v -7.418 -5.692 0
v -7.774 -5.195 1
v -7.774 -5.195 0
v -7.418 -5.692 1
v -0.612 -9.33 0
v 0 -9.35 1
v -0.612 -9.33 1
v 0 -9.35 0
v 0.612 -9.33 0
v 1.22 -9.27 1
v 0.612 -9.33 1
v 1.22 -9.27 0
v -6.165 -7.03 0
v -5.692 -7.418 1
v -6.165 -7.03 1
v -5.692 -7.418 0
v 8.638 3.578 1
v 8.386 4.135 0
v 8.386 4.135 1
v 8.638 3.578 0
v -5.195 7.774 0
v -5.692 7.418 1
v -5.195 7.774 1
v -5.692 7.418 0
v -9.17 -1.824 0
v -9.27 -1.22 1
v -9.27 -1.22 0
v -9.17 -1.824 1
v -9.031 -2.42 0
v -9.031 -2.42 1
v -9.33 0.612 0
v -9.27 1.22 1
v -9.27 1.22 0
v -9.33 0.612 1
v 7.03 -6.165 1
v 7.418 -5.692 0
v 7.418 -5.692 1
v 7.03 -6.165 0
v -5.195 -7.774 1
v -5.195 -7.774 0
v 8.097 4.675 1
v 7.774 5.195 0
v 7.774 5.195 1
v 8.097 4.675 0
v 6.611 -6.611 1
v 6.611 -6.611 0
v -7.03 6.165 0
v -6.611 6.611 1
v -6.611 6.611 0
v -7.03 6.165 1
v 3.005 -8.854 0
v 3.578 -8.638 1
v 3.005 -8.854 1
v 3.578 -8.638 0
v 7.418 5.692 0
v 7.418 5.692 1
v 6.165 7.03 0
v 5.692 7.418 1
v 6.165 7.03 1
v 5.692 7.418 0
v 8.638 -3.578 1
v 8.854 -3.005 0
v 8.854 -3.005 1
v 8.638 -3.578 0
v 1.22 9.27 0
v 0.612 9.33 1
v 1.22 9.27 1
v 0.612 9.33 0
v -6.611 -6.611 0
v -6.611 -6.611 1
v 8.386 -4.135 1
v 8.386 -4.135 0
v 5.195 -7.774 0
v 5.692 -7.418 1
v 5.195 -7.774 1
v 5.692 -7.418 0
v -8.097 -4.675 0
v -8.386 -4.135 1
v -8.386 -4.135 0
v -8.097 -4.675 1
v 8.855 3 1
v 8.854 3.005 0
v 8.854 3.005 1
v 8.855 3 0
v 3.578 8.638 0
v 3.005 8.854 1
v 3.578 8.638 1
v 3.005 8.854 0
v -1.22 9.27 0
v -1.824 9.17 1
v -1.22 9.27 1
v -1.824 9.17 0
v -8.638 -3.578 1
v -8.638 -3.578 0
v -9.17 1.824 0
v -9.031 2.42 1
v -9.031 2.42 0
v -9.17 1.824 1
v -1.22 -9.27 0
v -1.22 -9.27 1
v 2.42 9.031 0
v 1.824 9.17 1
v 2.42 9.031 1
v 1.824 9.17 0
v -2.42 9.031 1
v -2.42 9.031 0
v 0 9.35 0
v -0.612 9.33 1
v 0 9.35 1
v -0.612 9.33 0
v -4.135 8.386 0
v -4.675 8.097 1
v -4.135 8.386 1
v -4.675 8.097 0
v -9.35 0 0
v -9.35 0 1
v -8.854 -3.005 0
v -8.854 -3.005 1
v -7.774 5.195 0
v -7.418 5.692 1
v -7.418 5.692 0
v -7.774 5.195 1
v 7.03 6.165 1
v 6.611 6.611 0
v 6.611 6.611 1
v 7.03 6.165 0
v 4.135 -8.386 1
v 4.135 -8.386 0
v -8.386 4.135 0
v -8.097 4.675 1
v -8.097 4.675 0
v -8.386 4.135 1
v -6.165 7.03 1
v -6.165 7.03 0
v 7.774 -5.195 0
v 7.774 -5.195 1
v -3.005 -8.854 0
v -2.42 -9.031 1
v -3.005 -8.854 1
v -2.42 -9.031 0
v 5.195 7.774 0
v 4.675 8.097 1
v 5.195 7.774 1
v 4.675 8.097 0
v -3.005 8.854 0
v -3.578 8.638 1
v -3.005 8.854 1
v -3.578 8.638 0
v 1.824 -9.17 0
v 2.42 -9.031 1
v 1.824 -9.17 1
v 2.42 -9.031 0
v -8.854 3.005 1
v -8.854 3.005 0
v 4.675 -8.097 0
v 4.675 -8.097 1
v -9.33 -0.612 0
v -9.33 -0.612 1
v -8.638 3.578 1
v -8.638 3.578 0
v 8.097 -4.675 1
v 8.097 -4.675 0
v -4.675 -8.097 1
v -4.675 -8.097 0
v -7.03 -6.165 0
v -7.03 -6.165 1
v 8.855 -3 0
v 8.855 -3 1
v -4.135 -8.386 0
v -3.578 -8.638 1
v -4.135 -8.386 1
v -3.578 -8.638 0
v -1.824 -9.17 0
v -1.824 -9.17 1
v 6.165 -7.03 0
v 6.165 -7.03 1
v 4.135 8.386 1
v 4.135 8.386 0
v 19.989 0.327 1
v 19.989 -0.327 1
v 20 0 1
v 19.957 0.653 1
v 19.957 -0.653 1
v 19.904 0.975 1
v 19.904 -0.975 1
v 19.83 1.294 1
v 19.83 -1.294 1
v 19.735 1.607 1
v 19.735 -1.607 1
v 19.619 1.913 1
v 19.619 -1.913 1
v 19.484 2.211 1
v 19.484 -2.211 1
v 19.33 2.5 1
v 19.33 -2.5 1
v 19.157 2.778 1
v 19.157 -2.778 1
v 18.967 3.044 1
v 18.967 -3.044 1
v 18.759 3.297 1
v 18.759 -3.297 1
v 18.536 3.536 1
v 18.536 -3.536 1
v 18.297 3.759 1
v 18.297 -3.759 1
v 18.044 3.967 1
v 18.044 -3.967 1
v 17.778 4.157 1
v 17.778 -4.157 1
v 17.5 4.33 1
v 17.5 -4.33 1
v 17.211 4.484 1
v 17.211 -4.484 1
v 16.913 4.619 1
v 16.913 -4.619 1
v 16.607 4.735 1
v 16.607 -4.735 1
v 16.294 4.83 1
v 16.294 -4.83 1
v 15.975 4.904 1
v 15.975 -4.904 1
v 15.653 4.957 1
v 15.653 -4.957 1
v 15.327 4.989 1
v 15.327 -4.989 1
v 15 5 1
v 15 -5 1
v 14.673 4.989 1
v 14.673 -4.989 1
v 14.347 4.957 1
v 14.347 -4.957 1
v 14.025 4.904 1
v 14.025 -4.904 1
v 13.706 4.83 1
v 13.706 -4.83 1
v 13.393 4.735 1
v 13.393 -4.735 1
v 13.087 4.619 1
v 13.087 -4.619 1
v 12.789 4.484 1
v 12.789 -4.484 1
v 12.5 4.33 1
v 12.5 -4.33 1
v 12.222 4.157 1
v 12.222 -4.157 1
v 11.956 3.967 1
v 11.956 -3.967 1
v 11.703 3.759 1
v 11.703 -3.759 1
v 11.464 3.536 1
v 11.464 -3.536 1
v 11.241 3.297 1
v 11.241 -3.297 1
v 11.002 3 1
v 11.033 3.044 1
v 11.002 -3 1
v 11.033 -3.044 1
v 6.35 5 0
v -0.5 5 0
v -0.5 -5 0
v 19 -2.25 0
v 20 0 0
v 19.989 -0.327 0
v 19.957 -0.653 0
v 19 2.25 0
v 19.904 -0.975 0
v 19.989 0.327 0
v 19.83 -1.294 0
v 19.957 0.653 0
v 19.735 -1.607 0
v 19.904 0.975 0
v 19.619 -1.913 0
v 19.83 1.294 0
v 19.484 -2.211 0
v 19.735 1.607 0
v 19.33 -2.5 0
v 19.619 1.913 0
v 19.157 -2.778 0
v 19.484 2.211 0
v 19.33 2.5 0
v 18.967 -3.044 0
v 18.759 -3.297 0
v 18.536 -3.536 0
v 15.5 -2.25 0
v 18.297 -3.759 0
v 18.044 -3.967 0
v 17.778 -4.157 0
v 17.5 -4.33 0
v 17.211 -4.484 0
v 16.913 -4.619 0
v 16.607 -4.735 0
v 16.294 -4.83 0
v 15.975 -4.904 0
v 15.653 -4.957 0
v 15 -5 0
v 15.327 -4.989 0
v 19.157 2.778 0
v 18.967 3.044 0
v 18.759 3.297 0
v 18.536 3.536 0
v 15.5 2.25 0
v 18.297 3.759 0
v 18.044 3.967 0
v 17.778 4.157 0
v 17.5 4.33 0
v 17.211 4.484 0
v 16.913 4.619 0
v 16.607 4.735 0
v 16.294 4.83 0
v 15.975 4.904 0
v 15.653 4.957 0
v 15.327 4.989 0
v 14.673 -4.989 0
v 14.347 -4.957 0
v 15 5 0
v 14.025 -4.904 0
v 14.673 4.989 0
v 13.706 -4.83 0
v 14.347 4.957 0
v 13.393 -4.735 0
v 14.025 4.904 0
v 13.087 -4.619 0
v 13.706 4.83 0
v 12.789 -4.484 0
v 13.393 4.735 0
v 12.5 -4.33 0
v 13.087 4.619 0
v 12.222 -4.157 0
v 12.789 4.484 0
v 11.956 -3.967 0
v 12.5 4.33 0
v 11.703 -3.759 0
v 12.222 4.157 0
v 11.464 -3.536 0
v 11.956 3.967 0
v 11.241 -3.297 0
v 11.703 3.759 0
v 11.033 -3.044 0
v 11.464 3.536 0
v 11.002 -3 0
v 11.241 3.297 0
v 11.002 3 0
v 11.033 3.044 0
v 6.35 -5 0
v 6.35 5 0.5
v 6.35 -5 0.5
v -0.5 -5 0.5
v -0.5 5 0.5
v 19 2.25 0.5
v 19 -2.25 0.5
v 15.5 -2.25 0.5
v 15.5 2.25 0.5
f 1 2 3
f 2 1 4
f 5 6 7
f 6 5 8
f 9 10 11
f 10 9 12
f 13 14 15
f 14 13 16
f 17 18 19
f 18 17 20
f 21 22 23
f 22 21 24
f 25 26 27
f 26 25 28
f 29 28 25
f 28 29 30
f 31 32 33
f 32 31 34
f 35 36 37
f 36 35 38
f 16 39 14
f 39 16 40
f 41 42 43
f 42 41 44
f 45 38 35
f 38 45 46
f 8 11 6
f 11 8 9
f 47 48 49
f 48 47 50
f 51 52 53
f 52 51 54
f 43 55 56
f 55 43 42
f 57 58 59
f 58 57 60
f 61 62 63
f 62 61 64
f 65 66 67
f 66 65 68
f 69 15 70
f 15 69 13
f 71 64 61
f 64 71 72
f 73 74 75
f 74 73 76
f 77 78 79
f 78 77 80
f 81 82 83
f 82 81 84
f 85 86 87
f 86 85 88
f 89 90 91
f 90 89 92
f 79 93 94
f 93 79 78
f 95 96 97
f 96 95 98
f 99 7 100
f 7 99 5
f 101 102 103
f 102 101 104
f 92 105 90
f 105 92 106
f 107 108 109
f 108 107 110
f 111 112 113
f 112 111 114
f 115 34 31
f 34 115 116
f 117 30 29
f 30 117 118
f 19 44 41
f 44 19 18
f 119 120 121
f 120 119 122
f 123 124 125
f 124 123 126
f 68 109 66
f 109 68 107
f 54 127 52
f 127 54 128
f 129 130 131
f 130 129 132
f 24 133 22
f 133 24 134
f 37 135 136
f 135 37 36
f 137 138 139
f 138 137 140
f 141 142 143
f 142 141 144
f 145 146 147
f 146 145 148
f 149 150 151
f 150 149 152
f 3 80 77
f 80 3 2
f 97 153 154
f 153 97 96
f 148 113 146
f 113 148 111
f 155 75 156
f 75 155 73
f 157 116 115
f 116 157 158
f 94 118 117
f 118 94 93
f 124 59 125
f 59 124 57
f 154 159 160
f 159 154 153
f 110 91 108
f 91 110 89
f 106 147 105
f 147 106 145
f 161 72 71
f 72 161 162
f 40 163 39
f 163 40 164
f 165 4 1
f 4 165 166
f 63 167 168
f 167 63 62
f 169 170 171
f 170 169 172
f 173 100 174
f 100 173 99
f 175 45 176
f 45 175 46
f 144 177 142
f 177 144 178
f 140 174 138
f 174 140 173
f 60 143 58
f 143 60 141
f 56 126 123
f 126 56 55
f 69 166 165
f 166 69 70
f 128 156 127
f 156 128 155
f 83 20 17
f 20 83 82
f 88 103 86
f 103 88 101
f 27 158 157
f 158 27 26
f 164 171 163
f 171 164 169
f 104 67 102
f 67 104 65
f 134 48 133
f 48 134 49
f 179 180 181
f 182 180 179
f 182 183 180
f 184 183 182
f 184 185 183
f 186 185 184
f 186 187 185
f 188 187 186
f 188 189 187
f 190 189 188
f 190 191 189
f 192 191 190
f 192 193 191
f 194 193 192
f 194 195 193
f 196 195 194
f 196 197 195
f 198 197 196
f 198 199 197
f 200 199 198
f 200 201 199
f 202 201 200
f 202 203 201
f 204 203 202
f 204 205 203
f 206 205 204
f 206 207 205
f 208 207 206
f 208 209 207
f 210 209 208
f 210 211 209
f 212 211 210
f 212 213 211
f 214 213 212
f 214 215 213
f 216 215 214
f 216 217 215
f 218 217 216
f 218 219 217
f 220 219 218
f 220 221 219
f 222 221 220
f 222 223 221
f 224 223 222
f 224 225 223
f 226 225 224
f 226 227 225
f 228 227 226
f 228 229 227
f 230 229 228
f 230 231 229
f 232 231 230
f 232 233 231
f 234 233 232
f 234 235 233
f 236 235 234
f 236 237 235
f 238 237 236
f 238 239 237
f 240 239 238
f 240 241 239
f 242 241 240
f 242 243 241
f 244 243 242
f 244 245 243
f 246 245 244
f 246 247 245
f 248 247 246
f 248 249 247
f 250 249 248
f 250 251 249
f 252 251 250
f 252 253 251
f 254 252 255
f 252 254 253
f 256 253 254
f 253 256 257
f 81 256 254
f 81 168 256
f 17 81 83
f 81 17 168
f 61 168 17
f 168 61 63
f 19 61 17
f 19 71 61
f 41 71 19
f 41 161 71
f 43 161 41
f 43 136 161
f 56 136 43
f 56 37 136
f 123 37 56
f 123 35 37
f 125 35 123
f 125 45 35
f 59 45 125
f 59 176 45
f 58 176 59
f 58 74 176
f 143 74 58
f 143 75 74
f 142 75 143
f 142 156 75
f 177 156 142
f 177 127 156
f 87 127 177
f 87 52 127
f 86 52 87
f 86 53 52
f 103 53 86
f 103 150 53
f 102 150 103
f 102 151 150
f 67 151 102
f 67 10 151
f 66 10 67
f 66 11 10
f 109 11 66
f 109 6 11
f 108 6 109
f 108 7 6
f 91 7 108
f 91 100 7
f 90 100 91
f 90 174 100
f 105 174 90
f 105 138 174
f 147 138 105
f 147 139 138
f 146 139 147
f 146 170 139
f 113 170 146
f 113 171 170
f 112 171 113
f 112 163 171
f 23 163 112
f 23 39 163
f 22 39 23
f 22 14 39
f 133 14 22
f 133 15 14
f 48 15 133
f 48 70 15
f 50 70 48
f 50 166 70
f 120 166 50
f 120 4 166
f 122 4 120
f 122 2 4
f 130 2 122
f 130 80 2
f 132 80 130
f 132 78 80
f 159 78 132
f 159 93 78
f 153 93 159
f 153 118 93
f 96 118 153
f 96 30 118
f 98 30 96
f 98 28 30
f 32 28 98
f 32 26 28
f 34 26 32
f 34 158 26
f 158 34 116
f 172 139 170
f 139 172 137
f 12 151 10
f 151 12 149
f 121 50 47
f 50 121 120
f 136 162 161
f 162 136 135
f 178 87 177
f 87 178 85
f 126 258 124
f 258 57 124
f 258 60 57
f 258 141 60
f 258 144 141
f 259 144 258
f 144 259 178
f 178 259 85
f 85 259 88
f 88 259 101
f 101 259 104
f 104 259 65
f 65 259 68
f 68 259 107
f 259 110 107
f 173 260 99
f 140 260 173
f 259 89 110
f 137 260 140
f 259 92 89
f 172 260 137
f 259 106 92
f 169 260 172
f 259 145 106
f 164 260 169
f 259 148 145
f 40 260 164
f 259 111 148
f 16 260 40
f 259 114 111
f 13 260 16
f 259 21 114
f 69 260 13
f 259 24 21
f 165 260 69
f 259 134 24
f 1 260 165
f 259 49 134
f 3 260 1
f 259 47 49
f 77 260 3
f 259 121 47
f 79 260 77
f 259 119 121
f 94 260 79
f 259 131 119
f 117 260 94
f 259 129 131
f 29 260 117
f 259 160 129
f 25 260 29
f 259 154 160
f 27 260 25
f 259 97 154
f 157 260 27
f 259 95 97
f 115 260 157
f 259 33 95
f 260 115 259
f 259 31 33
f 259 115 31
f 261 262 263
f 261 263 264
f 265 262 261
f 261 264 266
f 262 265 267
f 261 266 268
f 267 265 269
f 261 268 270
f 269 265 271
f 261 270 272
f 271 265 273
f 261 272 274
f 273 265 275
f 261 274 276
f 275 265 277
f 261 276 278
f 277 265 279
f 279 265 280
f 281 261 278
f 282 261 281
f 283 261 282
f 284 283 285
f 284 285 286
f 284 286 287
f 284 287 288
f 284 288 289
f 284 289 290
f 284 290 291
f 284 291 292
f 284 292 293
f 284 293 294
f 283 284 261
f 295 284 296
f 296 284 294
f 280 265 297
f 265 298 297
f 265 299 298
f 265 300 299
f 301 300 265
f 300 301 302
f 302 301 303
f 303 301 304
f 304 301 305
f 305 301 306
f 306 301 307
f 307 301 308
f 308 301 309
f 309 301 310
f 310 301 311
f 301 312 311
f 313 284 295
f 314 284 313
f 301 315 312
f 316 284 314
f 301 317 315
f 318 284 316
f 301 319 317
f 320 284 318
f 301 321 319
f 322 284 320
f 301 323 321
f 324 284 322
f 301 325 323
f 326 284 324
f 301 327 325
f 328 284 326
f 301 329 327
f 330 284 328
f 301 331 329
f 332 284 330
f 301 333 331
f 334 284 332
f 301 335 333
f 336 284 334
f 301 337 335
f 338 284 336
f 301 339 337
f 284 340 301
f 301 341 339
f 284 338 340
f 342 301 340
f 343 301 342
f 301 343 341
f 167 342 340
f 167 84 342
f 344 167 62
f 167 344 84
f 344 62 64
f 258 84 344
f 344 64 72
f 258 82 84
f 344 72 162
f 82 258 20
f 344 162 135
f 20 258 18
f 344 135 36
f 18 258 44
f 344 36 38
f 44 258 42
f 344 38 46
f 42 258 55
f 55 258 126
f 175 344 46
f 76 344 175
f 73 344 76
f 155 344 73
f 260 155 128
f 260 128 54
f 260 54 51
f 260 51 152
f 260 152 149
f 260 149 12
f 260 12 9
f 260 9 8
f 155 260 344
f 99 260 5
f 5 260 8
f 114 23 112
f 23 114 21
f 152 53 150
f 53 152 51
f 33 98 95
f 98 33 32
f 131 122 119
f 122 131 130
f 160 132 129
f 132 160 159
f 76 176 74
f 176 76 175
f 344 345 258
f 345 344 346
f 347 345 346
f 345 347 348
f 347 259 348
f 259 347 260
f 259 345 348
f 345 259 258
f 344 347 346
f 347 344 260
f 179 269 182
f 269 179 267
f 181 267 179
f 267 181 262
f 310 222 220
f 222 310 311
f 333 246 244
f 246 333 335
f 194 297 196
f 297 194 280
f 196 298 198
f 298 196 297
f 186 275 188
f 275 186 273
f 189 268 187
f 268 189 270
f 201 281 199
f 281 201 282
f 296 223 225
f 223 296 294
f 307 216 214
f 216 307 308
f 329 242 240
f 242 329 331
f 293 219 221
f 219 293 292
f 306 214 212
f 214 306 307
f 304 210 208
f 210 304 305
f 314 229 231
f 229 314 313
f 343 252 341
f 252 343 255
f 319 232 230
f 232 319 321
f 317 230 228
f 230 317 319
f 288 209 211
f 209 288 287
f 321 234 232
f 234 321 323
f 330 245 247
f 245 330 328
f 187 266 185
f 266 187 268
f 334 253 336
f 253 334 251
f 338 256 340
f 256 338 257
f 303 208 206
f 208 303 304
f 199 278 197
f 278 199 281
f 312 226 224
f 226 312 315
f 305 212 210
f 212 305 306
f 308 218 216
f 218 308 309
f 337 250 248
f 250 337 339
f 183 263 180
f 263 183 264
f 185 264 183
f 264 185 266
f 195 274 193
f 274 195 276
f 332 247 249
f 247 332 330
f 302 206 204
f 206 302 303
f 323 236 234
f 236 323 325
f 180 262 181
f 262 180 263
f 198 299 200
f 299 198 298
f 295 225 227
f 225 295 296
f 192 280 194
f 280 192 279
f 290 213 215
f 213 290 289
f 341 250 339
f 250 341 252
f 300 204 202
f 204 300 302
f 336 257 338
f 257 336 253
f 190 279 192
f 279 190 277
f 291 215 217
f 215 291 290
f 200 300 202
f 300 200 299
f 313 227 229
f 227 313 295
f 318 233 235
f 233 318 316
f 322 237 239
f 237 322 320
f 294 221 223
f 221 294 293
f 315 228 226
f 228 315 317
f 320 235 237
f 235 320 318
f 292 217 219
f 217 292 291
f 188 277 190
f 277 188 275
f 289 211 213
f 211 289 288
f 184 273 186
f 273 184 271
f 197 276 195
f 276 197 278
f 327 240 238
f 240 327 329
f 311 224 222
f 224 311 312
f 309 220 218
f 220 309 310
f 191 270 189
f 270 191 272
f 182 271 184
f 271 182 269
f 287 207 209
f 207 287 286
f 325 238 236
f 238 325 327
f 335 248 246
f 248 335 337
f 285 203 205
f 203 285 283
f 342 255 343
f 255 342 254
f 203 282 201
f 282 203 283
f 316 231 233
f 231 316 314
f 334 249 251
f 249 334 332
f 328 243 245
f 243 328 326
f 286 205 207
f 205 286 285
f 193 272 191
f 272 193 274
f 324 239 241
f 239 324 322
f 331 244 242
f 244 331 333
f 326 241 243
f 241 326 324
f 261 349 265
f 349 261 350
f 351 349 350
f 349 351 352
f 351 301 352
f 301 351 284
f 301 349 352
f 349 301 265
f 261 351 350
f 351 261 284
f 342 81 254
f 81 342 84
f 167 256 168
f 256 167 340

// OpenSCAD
// Snap-on clip for tubing next to a 12.7 mm lab stand rod
// Print orientation: flat on the bed, extruded along +Z

// ---------------- Parameters ----------------
rod_id        = 12.7;   // stand rod inner diameter (1/2 inch)
rod_wall      = 3;      // stand rod ring wall thickness
ring_open     = 10;     // width of opening cut from the -X side of the rod ring

tube_id       = 6;      // tubing inner diameter
tube_wall     = 2;      // tubing ring wall thickness
tube_x        = 15;     // tubing ring centre X position
tube_open     = 4.5;    // width of opening cut from the +X side of the tubing ring

bridge_x1     = 8;      // bridge start X position
bridge_x2     = 12;     // bridge end X position
bridge_w      = 6;      // bridge width along Y

eps           = 0.5;    // cutter overshoot past faces
$fn           = 96;     // curve resolution

// ---------------- Derived ----------------
rod_od    = rod_id + 2 * rod_wall;   // 18.7 mm outer diameter of rod ring
tube_od   = tube_id + 2 * tube_wall; // 10 mm outer diameter of tubing ring

// ---------------- Profile (in XY) ----------------
module rod_ring() {
    difference() {
        translate([0, 0])
            cylinder(d = rod_od, h = 1);
        // Opening: everything with x < 0 and -5 < y < 5
        translate([-eps, -ring_open / 2, -eps])
            cube([eps + rod_id / 2, ring_open, 2 * eps]);
    }
}

module tube_ring() {
    difference() {
        translate([tube_x, 0])
            cylinder(d = tube_od, h = 1);
        // Opening: x > 15 and -2.25 < y < 2.25
        translate([tube_x + eps, -tube_open / 2, -eps])
            cube([eps + tube_id / 2, tube_open, 2 * eps]);
    }
}

module bridge() {
    // Solid block between x = 8 and x = 12, 6 mm wide in Y, 1 mm tall
    translate([bridge_x1, -bridge_w / 2, 0])
        cube([bridge_x2 - bridge_x1, bridge_w, 1]);
}

// ---------------- Assembly ----------------
union() {
    rod_ring();
    tube_ring();
    bridge();
}
